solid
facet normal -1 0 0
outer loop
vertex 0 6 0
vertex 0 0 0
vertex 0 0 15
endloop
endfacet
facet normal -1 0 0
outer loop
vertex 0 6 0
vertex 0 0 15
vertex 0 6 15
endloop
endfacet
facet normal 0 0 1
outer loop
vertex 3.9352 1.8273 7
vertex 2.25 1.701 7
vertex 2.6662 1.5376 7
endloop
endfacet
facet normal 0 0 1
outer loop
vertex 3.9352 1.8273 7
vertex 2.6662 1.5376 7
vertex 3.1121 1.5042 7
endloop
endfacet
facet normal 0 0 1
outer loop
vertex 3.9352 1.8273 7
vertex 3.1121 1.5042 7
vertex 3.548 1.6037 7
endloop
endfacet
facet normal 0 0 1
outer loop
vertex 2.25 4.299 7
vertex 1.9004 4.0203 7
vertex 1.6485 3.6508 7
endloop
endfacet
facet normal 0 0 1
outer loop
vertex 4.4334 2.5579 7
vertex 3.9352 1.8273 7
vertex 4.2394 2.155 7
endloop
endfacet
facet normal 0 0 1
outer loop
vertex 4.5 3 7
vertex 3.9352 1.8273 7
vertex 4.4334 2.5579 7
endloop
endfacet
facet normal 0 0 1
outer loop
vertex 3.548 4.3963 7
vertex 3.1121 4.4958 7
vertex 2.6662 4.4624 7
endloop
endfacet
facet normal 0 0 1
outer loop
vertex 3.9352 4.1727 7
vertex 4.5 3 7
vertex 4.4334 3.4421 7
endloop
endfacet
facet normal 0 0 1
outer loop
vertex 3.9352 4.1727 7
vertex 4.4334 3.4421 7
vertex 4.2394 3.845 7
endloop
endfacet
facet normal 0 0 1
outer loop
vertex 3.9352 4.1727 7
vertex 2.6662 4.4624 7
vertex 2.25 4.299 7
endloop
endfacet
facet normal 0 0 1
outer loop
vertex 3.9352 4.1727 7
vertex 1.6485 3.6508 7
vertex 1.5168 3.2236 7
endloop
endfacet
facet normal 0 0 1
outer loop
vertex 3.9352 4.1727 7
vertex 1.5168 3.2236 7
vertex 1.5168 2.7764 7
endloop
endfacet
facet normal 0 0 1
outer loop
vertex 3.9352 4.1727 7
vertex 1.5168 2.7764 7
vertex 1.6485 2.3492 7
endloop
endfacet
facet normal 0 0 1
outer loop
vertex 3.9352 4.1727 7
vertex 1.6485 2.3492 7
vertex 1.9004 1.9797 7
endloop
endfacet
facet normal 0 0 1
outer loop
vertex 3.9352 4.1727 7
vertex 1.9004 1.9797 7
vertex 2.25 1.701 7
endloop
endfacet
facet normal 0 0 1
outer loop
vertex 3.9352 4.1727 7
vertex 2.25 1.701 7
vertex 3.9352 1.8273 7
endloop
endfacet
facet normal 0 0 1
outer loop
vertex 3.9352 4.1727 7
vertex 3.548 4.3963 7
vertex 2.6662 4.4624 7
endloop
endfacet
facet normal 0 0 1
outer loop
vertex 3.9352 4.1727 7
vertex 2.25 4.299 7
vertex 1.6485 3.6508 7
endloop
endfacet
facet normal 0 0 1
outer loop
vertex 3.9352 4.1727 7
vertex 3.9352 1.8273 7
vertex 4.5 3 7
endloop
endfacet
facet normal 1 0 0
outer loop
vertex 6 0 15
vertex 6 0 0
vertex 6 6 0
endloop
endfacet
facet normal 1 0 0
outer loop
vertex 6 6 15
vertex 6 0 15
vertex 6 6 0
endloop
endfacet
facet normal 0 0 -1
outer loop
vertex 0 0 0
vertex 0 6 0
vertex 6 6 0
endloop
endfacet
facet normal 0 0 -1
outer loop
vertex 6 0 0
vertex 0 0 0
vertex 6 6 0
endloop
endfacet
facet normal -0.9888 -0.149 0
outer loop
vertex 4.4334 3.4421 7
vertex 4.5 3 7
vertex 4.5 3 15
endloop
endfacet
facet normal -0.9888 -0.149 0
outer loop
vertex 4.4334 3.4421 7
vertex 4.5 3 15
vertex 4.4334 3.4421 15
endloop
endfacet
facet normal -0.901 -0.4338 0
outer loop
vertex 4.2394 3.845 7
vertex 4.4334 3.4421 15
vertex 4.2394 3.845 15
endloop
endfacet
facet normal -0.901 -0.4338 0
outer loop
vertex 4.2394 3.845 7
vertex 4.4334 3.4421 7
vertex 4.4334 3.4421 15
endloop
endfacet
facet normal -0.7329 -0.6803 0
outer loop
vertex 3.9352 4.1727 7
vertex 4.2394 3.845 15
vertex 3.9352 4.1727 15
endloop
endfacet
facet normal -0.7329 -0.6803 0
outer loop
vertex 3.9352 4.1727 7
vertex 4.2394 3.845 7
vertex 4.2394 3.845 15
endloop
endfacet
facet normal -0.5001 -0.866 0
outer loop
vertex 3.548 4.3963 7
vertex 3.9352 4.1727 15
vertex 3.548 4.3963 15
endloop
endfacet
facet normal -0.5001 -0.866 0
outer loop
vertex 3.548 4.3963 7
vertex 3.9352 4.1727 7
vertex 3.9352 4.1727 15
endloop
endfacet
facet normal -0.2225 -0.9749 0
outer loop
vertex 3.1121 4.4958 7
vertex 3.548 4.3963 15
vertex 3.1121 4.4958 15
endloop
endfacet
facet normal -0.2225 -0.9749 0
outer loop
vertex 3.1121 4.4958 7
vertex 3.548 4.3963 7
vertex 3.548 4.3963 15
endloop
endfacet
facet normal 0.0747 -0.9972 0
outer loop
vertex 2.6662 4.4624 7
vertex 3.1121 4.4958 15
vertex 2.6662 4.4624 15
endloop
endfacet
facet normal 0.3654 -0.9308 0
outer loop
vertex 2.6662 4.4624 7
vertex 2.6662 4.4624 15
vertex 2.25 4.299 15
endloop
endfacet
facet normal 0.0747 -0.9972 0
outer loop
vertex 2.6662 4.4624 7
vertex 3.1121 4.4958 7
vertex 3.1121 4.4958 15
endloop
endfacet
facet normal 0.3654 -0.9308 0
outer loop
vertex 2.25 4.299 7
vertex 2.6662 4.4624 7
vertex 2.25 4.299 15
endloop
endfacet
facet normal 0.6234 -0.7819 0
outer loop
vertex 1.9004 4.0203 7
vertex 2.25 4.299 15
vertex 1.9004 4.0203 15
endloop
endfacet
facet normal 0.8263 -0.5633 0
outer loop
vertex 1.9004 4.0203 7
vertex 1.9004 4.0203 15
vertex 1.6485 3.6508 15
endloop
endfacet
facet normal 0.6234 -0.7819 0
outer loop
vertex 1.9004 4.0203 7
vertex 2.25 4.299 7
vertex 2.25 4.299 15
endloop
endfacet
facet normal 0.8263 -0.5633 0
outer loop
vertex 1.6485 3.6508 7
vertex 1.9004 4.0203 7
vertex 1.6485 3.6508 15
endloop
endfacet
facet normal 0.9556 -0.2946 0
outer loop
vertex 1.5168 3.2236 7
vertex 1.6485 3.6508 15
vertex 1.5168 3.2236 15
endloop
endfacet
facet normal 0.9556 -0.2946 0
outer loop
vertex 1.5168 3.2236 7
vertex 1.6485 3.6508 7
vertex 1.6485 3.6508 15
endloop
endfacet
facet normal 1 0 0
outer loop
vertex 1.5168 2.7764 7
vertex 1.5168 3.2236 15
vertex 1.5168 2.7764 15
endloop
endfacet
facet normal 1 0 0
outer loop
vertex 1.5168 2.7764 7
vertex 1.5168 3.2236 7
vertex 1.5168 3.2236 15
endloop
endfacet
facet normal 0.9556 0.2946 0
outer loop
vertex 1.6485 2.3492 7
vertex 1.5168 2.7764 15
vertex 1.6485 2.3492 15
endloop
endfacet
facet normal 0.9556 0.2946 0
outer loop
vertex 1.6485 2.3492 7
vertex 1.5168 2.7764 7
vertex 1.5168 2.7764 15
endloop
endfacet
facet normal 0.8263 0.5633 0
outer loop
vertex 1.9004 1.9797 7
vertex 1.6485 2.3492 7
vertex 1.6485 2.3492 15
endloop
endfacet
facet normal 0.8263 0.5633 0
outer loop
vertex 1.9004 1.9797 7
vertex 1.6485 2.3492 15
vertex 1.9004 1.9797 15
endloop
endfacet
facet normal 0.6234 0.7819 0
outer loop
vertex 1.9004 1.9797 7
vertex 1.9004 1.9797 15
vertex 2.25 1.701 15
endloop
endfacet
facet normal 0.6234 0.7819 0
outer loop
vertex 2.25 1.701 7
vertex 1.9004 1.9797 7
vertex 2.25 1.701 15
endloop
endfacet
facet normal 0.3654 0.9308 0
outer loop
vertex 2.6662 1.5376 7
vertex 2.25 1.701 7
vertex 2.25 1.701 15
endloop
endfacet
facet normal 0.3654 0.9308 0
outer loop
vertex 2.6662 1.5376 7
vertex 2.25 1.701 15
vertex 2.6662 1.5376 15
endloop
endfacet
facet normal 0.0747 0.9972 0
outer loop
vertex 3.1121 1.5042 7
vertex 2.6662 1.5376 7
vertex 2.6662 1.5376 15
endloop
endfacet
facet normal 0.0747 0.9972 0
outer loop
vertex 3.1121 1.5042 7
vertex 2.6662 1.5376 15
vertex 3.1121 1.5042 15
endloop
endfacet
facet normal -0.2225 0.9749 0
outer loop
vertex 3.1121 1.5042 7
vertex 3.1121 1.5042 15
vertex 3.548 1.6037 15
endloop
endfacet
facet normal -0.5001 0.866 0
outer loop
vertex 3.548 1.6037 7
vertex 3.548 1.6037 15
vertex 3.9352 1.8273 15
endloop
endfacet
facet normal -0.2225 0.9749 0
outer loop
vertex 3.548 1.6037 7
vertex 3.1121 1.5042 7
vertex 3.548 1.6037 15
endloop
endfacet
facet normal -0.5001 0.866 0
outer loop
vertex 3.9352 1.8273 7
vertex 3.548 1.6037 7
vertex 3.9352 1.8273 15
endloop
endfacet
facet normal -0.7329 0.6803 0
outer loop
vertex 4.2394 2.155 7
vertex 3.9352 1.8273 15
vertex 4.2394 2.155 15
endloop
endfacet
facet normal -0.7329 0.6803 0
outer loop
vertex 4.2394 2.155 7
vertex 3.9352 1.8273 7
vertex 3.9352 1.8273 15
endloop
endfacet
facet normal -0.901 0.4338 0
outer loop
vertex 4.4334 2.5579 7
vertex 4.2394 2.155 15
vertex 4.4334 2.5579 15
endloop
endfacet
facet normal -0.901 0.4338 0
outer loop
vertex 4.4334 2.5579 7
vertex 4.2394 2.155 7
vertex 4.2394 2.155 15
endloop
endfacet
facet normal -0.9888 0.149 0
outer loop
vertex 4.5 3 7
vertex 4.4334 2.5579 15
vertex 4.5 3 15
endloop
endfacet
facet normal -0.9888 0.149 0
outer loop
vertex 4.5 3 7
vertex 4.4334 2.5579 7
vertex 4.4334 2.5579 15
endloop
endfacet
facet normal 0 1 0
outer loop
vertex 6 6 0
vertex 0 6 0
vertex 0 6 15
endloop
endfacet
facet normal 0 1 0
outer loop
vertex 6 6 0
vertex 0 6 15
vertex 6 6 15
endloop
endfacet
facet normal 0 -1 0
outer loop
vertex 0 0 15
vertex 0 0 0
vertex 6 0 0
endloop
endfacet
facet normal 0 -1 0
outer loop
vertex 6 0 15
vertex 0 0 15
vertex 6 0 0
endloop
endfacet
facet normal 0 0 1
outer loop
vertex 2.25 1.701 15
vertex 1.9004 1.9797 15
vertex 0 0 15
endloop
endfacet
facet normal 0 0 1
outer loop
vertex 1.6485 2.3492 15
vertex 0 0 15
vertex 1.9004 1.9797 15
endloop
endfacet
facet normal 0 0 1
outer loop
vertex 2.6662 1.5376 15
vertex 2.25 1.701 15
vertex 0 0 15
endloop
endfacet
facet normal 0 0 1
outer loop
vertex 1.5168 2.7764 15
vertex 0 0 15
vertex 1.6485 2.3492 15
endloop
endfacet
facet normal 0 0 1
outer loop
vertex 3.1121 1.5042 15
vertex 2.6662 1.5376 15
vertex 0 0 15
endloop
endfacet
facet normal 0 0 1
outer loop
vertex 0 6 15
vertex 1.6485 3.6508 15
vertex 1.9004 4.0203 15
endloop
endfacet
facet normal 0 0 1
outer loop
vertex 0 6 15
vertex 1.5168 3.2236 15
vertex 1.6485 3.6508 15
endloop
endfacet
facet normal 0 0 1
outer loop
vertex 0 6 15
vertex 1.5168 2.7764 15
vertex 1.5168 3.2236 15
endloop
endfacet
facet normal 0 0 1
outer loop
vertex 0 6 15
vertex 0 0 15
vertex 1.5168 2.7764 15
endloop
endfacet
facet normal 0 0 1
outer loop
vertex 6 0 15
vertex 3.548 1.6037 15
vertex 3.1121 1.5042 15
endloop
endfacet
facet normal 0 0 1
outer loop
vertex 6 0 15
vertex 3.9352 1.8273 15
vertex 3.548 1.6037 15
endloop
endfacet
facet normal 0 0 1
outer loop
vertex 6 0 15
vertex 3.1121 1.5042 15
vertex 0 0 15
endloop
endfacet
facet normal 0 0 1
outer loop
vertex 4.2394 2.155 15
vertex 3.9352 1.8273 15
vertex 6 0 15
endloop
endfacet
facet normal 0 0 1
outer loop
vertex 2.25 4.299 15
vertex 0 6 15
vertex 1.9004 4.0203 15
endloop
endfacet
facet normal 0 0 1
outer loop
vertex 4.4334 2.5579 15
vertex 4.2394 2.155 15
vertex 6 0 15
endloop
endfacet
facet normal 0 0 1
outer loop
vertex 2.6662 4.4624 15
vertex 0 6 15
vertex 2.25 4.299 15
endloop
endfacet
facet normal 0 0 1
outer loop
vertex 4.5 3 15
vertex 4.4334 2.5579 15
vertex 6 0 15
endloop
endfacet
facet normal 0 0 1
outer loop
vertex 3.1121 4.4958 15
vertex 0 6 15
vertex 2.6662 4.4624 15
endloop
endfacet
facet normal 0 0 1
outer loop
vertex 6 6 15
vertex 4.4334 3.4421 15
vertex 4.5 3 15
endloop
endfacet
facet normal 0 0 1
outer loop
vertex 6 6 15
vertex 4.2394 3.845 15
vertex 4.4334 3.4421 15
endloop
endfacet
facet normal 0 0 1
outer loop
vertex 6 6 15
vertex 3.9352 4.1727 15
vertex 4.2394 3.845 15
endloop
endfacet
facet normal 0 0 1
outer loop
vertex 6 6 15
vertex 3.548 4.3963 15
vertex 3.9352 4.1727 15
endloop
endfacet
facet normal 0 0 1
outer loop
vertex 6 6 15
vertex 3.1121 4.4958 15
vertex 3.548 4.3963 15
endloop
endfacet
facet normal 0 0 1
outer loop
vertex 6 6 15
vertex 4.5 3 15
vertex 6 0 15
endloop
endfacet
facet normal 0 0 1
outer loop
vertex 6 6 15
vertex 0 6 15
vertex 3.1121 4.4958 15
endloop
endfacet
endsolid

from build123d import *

# Parameters (mm, degrees)
CYLINDER_R     = 1.5
CYLINDER_DEPTH = 8
BOX_W          = 6
BOX_H          = 6
BOX_DEPTH      = 15


with BuildPart() as cylinder:
    # Cylinder → Cylinder (new body)
    with BuildSketch(Plane(origin=(3, 3, 7), x_dir=(1, 0, 0), z_dir=(0, 0, 1))):
        Circle(CYLINDER_R)
    extrude(amount=CYLINDER_DEPTH)


with BuildPart() as cut:
    # Box → Box (new body)
    with BuildSketch(Plane.XY):
        with Locations((3, 3)):
            Rectangle(BOX_W, BOX_H)
    extrude(amount=BOX_DEPTH)

    # Cut: cut Cylinder
    add(cylinder.part, mode=Mode.SUBTRACT)


solid = cut.part
